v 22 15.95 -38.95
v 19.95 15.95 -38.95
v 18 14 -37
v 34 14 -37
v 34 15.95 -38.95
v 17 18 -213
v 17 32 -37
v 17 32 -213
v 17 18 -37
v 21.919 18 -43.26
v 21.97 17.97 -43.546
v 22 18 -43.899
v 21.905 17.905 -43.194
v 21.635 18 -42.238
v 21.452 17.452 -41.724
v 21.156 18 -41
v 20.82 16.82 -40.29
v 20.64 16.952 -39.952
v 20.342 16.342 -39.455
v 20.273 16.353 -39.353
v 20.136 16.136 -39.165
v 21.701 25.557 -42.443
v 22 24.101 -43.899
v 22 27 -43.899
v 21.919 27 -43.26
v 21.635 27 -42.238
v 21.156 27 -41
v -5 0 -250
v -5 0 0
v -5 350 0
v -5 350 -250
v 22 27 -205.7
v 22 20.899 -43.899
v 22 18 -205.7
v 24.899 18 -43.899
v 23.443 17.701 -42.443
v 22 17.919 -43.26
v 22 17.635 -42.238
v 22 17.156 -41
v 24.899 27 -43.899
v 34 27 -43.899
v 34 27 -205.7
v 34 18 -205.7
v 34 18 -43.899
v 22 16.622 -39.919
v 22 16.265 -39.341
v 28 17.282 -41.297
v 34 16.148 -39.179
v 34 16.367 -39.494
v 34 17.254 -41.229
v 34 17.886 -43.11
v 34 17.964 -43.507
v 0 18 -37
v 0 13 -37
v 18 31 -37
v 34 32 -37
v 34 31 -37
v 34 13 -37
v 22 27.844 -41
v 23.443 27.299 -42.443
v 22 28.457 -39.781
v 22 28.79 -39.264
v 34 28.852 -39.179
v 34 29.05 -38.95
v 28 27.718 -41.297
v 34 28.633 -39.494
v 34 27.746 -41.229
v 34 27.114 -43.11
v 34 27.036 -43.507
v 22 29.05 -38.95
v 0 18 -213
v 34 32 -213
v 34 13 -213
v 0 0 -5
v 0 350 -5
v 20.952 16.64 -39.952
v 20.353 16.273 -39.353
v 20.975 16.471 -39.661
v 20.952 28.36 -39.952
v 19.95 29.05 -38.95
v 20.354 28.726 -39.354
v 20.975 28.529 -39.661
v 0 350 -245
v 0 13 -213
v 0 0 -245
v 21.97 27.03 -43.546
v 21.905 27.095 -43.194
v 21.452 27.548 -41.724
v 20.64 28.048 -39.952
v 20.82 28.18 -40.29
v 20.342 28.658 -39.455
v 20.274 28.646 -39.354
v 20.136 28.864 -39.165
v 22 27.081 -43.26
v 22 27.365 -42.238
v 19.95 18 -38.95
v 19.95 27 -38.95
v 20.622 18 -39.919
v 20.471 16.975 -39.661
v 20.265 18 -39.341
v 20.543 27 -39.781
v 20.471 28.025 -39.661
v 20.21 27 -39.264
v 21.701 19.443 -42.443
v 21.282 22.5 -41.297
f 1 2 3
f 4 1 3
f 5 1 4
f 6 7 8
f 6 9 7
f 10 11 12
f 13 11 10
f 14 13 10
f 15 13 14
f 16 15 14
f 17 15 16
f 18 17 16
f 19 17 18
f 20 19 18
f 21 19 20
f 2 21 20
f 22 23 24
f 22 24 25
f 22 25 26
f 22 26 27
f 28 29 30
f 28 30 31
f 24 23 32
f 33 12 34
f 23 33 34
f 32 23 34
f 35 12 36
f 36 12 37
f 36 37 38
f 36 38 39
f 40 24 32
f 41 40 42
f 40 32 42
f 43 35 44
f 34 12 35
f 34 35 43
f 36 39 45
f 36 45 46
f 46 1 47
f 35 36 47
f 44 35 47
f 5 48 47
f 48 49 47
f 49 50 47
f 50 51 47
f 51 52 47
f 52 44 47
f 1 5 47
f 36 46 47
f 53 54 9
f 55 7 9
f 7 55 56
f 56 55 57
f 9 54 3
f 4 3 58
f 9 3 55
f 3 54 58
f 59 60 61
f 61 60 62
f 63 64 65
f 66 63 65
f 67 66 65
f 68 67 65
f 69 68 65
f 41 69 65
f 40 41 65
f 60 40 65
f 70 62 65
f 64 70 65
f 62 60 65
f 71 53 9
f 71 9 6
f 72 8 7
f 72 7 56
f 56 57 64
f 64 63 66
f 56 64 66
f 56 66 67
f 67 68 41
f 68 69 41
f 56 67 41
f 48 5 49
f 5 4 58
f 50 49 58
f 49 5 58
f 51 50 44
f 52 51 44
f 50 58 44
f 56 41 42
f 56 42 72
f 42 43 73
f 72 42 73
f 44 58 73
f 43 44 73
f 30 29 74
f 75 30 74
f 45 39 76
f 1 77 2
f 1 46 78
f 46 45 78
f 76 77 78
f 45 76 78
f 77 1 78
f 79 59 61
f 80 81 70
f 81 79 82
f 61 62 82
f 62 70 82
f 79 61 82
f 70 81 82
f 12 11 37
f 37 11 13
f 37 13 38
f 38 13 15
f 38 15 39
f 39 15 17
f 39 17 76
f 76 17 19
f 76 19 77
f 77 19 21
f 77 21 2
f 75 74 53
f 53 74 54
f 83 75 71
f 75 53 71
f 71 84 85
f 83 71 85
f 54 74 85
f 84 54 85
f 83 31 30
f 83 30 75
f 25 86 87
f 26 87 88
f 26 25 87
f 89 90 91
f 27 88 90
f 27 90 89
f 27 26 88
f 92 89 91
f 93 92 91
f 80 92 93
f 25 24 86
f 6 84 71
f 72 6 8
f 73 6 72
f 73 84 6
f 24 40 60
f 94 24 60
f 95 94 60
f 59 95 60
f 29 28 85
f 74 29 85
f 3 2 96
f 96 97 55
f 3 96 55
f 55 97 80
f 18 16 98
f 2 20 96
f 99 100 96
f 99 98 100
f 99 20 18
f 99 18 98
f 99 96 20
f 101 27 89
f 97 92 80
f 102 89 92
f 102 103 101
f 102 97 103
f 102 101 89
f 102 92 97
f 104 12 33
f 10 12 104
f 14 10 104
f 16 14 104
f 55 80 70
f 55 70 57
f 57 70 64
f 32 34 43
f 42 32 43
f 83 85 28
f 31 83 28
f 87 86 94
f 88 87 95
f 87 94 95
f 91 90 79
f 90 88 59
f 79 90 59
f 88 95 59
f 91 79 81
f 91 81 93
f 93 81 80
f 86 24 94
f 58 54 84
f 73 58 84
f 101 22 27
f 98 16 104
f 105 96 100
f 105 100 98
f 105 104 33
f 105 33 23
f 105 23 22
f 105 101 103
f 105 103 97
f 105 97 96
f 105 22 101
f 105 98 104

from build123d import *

# Parameters (mm, degrees)
CROQUIS1_W              = 5
CROQUIS1_H              = 250
SALIENTE_EXTRUIR1_DEPTH = 350
CORTAR_EXTRUIR1_REACH   = 432.145
CROQUIS4_W              = 176
CROQUIS4_H              = 5
SALIENTE_EXTRUIR2_DEPTH = 34
CROQUIS5_W              = 5
CROQUIS5_H              = 176
SALIENTE_EXTRUIR3_DEPTH = 9
CROQUIS6_W              = 17
CROQUIS6_H              = 176
SALIENTE_EXTRUIR4_DEPTH = 5
CHAFL_N1_SIZE           = 4
CROQUIS7_W              = 14.582348404
CROQUIS7_H              = 7.3
SALIENTE_EXTRUIR5_DEPTH = 10


with BuildPart() as part:
    # Croquis1 → Saliente-Extruir1 (new body)
    with BuildSketch(Plane(origin=(0, 0, 0), x_dir=(1, 0, 0), z_dir=(0, 1, 0))):
        with Locations((-2.5, 125)):
            Rectangle(CROQUIS1_W, CROQUIS1_H)
    extrude(amount=SALIENTE_EXTRUIR1_DEPTH)

    # Croquis2 → Cortar-Extruir1 (cut, up to next)
    with BuildSketch(Plane(origin=(0, 350, 0), x_dir=(1, 0, 0), z_dir=(0, 1, 0)), mode=Mode.PRIVATE) as cortar_extruir1_sk1:
        Polygon((0, 250), (0, 245), (-5, 250), align=None)
    cortar_extruir1_tool1 = extrude(cortar_extruir1_sk1.sketch, amount=-CORTAR_EXTRUIR1_REACH, mode=Mode.PRIVATE) & part.part
    # Croquis2 → Cortar-Extruir1 (cut, up to next)
    with BuildSketch(Plane(origin=(0, 350, 0), x_dir=(1, 0, 0), z_dir=(0, 1, 0)), mode=Mode.PRIVATE) as cortar_extruir1_sk2:
        Polygon((-5, 0), (0, 5), (0, 0), align=None)
    cortar_extruir1_tool2 = extrude(cortar_extruir1_sk2.sketch, amount=-CORTAR_EXTRUIR1_REACH, mode=Mode.PRIVATE) & part.part
    add(cortar_extruir1_tool1.solids().sort_by_distance((-1.666667, 350, -248.333333))[0], mode=Mode.SUBTRACT)
    add(cortar_extruir1_tool2.solids().sort_by_distance((-1.666667, 350, -1.666667))[0], mode=Mode.SUBTRACT)

    # Croquis4 → Saliente-Extruir2 (add)
    with BuildSketch(Plane(origin=(0, 0, 0), x_dir=(0, 0, -1), z_dir=(1, 0, 0))):
        with Locations((125, 15.5)):
            Rectangle(CROQUIS4_W, CROQUIS4_H)
    extrude(amount=SALIENTE_EXTRUIR2_DEPTH)

    # Croquis5 → Saliente-Extruir3 (add)
    with BuildSketch(Plane(origin=(0, 18, 0), x_dir=(1, 0, 0), z_dir=(0, 1, 0))):
        with Locations((19.5, 125)):
            Rectangle(CROQUIS5_W, CROQUIS5_H)
    extrude(amount=SALIENTE_EXTRUIR3_DEPTH)

    # Croquis6 → Saliente-Extruir4 (add)
    with BuildSketch(Plane(origin=(0, 27, 0), x_dir=(1, 0, 0), z_dir=(0, 1, 0))):
        with Locations((25.5, 125)):
            Rectangle(CROQUIS6_W, CROQUIS6_H)
    extrude(amount=SALIENTE_EXTRUIR4_DEPTH)

    # Chaflán1
    chafl_n1_edges = [part.edges().sort_by_distance(p)[0] for p in [
        (28, 18, -37),
        (22, 22.5, -37),
        (28, 27, -37),
    ]]
    chamfer(chafl_n1_edges, length=CHAFL_N1_SIZE)

    # Redondeo1
    # a fillet whose section is not a circle: 7 mm, written as the material it takes off along each edge
    with BuildSketch(Plane(origin=(14.751262658, 18, -41), x_dir=(0, 0, -1), z_dir=(1, 0, 0))) as redondeo1_piece_1_section:
        with BuildLine():
            Bezier((2.899494937, 0), (0, 0), (-2.050252532, -2.050252532), weights=[1, 0.428571429, 1])
            Line((-2.050252532, -2.050252532), (0, 0))
            Line((0, 0), (2.899494937, 0))
        make_face()
    redondeo1_piece_1 = extrude(amount=26.497474683, mode=Mode.PRIVATE)
    redondeo1_piece_1 = split(redondeo1_piece_1, bisect_by=Plane(origin=(22, 18, -41), z_dir=(-1, 0, 0)), keep=Keep.TOP, mode=Mode.PRIVATE)
    redondeo1_piece_1 = split(redondeo1_piece_1, bisect_by=Plane(origin=(18.375631329, 18, -37.375631329), z_dir=(0.7071067811865476, 0, 0.7071067811865476)), keep=Keep.TOP, mode=Mode.PRIVATE)
    add(redondeo1_piece_1, mode=Mode.SUBTRACT)
    with BuildSketch(Plane(origin=(22, 18, -41), x_dir=(0, 0, -1), z_dir=(1, 0, 0))) as redondeo1_piece_2_section:
        with BuildLine():
            Bezier((2.899494937, 0), (0, 0), (-2.050252532, -2.050252532), weights=[1, 0.428571429, 1])
            Line((-2.050252532, -2.050252532), (0, 0))
            Line((0, 0), (2.899494937, 0))
        make_face()
    redondeo1_piece_2 = extrude(amount=19.248737342, mode=Mode.PRIVATE)
    redondeo1_piece_2 = split(redondeo1_piece_2, bisect_by=Plane(origin=(22, 18, -41), z_dir=(-0.7071067811865476, 0, -0.7071067811865476)), keep=Keep.TOP, mode=Mode.PRIVATE)
    add(redondeo1_piece_2, mode=Mode.SUBTRACT)
    with BuildSketch(Plane(origin=(22, 18, -41), x_dir=(0, 0, -1), z_dir=(1, 0, 0))) as redondeo1_piece_3_section:
        with BuildLine():
            Bezier((2.899494937, 0), (0, 0), (-2.050252532, -2.050252532), weights=[1, 0.428571429, 1])
            Line((-2.050252532, -2.050252532), (0, 0))
            Line((0, 0), (2.899494937, 0))
        make_face()
    redondeo1_piece_3 = extrude(amount=19.248737342, mode=Mode.PRIVATE)
    redondeo1_piece_3 = split(redondeo1_piece_3, bisect_by=Plane(origin=(22, 18, -41), z_dir=(0.7071067811865476, 0, 0.7071067811865476)), keep=Keep.TOP, mode=Mode.PRIVATE)
    add(redondeo1_piece_3, mode=Mode.SUBTRACT)
    with BuildSketch(Plane(origin=(22, 10.751262658, -41), x_dir=(0, 0, -1), z_dir=(0, 1, 0))) as redondeo1_piece_4_section:
        with BuildLine():
            Bezier((2.899494937, 0), (0, 0), (-2.050252532, 2.050252532), weights=[1, 0.428571429, 1])
            Line((-2.050252532, 2.050252532), (0, 0))
            Line((0, 0), (2.899494937, 0))
        make_face()
    redondeo1_piece_4 = extrude(amount=16.248737342, mode=Mode.PRIVATE)
    redondeo1_piece_4 = split(redondeo1_piece_4, bisect_by=Plane(origin=(22, 18, -41), z_dir=(0, -1, 0)), keep=Keep.TOP, mode=Mode.PRIVATE)
    redondeo1_piece_4 = split(redondeo1_piece_4, bisect_by=Plane(origin=(22, 14.375631329, -37.375631329), z_dir=(0, 0.7071067811865476, 0.7071067811865476)), keep=Keep.TOP, mode=Mode.PRIVATE)
    add(redondeo1_piece_4, mode=Mode.SUBTRACT)
    with BuildSketch(Plane(origin=(22, 18, -41), x_dir=(0, 0, -1), z_dir=(0, 1, 0))) as redondeo1_piece_5_section:
        with BuildLine():
            Bezier((2.899494937, 0), (0, 0), (-2.050252532, 2.050252532), weights=[1, 0.428571429, 1])
            Line((-2.050252532, 2.050252532), (0, 0))
            Line((0, 0), (2.899494937, 0))
        make_face()
    redondeo1_piece_5 = extrude(amount=9, mode=Mode.PRIVATE)
    redondeo1_piece_5 = split(redondeo1_piece_5, bisect_by=Plane(origin=(22, 18, -41), z_dir=(0, -0.7071067811865476, -0.7071067811865476)), keep=Keep.TOP, mode=Mode.PRIVATE)
    add(redondeo1_piece_5, mode=Mode.SUBTRACT)
    with BuildSketch(Plane(origin=(22, 18, -41), x_dir=(0, 0, -1), z_dir=(0, 1, 0))) as redondeo1_piece_6_section:
        with BuildLine():
            Bezier((2.899494937, 0), (0, 0), (-2.050252532, 2.050252532), weights=[1, 0.428571429, 1])
            Line((-2.050252532, 2.050252532), (0, 0))
            Line((0, 0), (2.899494937, 0))
        make_face()
    redondeo1_piece_6 = extrude(amount=9, mode=Mode.PRIVATE)
    redondeo1_piece_6 = split(redondeo1_piece_6, bisect_by=Plane(origin=(22, 18, -41), z_dir=(0, 0.7071067811865476, 0.7071067811865476)), keep=Keep.TOP, mode=Mode.PRIVATE)
    redondeo1_piece_6 = split(redondeo1_piece_6, bisect_by=Plane(origin=(22, 22.5, -45.5), z_dir=(0, -0.7071067811865476, 0.7071067811865476)), keep=Keep.TOP, mode=Mode.PRIVATE)
    add(redondeo1_piece_6, mode=Mode.SUBTRACT)
    with BuildSketch(Plane(origin=(22, 18, -41), x_dir=(0, 0, -1), z_dir=(0, 1, 0))) as redondeo1_piece_7_section:
        with BuildLine():
            Bezier((2.899494937, 0), (0, 0), (-2.050252532, 2.050252532), weights=[1, 0.428571429, 1])
            Line((-2.050252532, 2.050252532), (0, 0))
            Line((0, 0), (2.899494937, 0))
        make_face()
    redondeo1_piece_7 = extrude(amount=16.248737342, mode=Mode.PRIVATE)
    redondeo1_piece_7 = split(redondeo1_piece_7, bisect_by=Plane(origin=(22, 27, -41), z_dir=(0, 1, 0)), keep=Keep.TOP, mode=Mode.PRIVATE)
    redondeo1_piece_7 = split(redondeo1_piece_7, bisect_by=Plane(origin=(22, 22.5, -45.5), z_dir=(0, -0.7071067811865476, 0.7071067811865476)), keep=Keep.TOP, mode=Mode.PRIVATE)
    add(redondeo1_piece_7, mode=Mode.SUBTRACT)
    with BuildSketch(Plane(origin=(22, 18, -41), x_dir=(0, 0, -1), z_dir=(0, 1, 0))) as redondeo1_piece_8_section:
        with BuildLine():
            Bezier((2.899494937, 0), (0, 0), (-2.050252532, 2.050252532), weights=[1, 0.428571429, 1])
            Line((-2.050252532, 2.050252532), (0, 0))
            Line((0, 0), (2.899494937, 0))
        make_face()
    redondeo1_piece_8 = extrude(amount=9, mode=Mode.PRIVATE)
    redondeo1_piece_8 = split(redondeo1_piece_8, bisect_by=Plane(origin=(22, 22.5, -45.5), z_dir=(0, 0.7071067811865476, -0.7071067811865476)), keep=Keep.TOP, mode=Mode.PRIVATE)
    add(redondeo1_piece_8, mode=Mode.SUBTRACT)
    with BuildSketch(Plane(origin=(41.248737342, 27, -41), x_dir=(0, 0, -1), z_dir=(-1, 0, 0))) as redondeo1_piece_9_section:
        with BuildLine():
            Bezier((2.899494937, 0), (0, 0), (-2.050252532, -2.050252532), weights=[1, 0.428571429, 1])
            Line((-2.050252532, -2.050252532), (0, 0))
            Line((0, 0), (2.899494937, 0))
        make_face()
    redondeo1_piece_9 = extrude(amount=19.248737342, mode=Mode.PRIVATE)
    redondeo1_piece_9 = split(redondeo1_piece_9, bisect_by=Plane(origin=(31.624368671, 27, -50.624368671), z_dir=(0.7071067811865476, 0, 0.7071067811865476)), keep=Keep.TOP, mode=Mode.PRIVATE)
    add(redondeo1_piece_9, mode=Mode.SUBTRACT)
    with BuildSketch(Plane(origin=(41.248737342, 27, -41), x_dir=(0, 0, -1), z_dir=(-1, 0, 0))) as redondeo1_piece_10_section:
        with BuildLine():
            Bezier((2.899494937, 0), (0, 0), (-2.050252532, -2.050252532), weights=[1, 0.428571429, 1])
            Line((-2.050252532, -2.050252532), (0, 0))
            Line((0, 0), (2.899494937, 0))
        make_face()
    redondeo1_piece_10 = extrude(amount=26.497474683, mode=Mode.PRIVATE)
    redondeo1_piece_10 = split(redondeo1_piece_10, bisect_by=Plane(origin=(22, 27, -41), z_dir=(-1, 0, 0)), keep=Keep.TOP, mode=Mode.PRIVATE)
    redondeo1_piece_10 = split(redondeo1_piece_10, bisect_by=Plane(origin=(31.624368671, 27, -50.624368671), z_dir=(0.7071067811865476, 0, 0.7071067811865476)), keep=Keep.TOP, mode=Mode.PRIVATE)
    add(redondeo1_piece_10, mode=Mode.SUBTRACT)
    with BuildSketch(Plane(origin=(41.248737342, 27, -41), x_dir=(0, 0, -1), z_dir=(-1, 0, 0))) as redondeo1_piece_11_section:
        with BuildLine():
            Bezier((2.899494937, 0), (0, 0), (-2.050252532, -2.050252532), weights=[1, 0.428571429, 1])
            Line((-2.050252532, -2.050252532), (0, 0))
            Line((0, 0), (2.899494937, 0))
        make_face()
    redondeo1_piece_11 = extrude(amount=19.248737342, mode=Mode.PRIVATE)
    redondeo1_piece_11 = split(redondeo1_piece_11, bisect_by=Plane(origin=(31.624368671, 27, -50.624368671), z_dir=(-0.7071067811865476, 0, -0.7071067811865476)), keep=Keep.TOP, mode=Mode.PRIVATE)
    add(redondeo1_piece_11, mode=Mode.SUBTRACT)
    with BuildSketch(Plane(origin=(14.751262658, 18, -41), x_dir=(0, 0, -1), z_dir=(1, 0, 0))) as redondeo1_piece_12a_section:
        with BuildLine():
            Bezier((2.899494937, 0), (0, 0), (-2.050252532, -2.050252532), weights=[1, 0.428571429, 1])
            Line((-2.050252532, -2.050252532), (0, 0))
            Line((0, 0), (2.899494937, 0))
        make_face()
    redondeo1_piece_12a = extrude(amount=26.497474683, mode=Mode.PRIVATE)
    redondeo1_piece_12a = split(redondeo1_piece_12a, bisect_by=Plane(origin=(22, 18, -41), z_dir=(-1, 0, 0)), keep=Keep.TOP, mode=Mode.PRIVATE)
    redondeo1_piece_12a = split(redondeo1_piece_12a, bisect_by=Plane(origin=(18.375631329, 18, -37.375631329), z_dir=(-0.7071067811865476, 0, -0.7071067811865476)), keep=Keep.TOP, mode=Mode.PRIVATE)
    redondeo1_piece_12a = split(redondeo1_piece_12a, bisect_by=Plane(origin=(17, 18, -41), z_dir=(1, 0, 0)), keep=Keep.TOP, mode=Mode.PRIVATE)
    with BuildSketch(Plane(origin=(22, 10.751262658, -41), x_dir=(0, 0, -1), z_dir=(0, 1, 0))) as redondeo1_piece_12b_section:
        with BuildLine():
            Bezier((2.899494937, 0), (0, 0), (-2.050252532, 2.050252532), weights=[1, 0.428571429, 1])
            Line((-2.050252532, 2.050252532), (0, 0))
            Line((0, 0), (2.899494937, 0))
        make_face()
    redondeo1_piece_12b = extrude(amount=16.248737342, mode=Mode.PRIVATE)
    redondeo1_piece_12b = split(redondeo1_piece_12b, bisect_by=Plane(origin=(22, 18, -41), z_dir=(0, -1, 0)), keep=Keep.TOP, mode=Mode.PRIVATE)
    redondeo1_piece_12b = split(redondeo1_piece_12b, bisect_by=Plane(origin=(22, 14.375631329, -37.375631329), z_dir=(0, -0.7071067811865476, -0.7071067811865476)), keep=Keep.TOP, mode=Mode.PRIVATE)
    redondeo1_piece_12 = redondeo1_piece_12a & redondeo1_piece_12b
    add(redondeo1_piece_12, mode=Mode.SUBTRACT)
    with BuildSketch(Plane(origin=(22, 18, -41), x_dir=(0, 0, -1), z_dir=(0, 1, 0))) as redondeo1_piece_13a_section:
        with BuildLine():
            Bezier((2.899494937, 0), (0, 0), (-2.050252532, 2.050252532), weights=[1, 0.428571429, 1])
            Line((-2.050252532, 2.050252532), (0, 0))
            Line((0, 0), (2.899494937, 0))
        make_face()
    redondeo1_piece_13a = extrude(amount=16.248737342, mode=Mode.PRIVATE)
    redondeo1_piece_13a = split(redondeo1_piece_13a, bisect_by=Plane(origin=(22, 27, -41), z_dir=(0, 1, 0)), keep=Keep.TOP, mode=Mode.PRIVATE)
    redondeo1_piece_13a = split(redondeo1_piece_13a, bisect_by=Plane(origin=(22, 22.5, -45.5), z_dir=(0, 0.7071067811865476, -0.7071067811865476)), keep=Keep.TOP, mode=Mode.PRIVATE)
    with BuildSketch(Plane(origin=(41.248737342, 27, -41), x_dir=(0, 0, -1), z_dir=(-1, 0, 0))) as redondeo1_piece_13b_section:
        with BuildLine():
            Bezier((2.899494937, 0), (0, 0), (-2.050252532, -2.050252532), weights=[1, 0.428571429, 1])
            Line((-2.050252532, -2.050252532), (0, 0))
            Line((0, 0), (2.899494937, 0))
        make_face()
    redondeo1_piece_13b = extrude(amount=26.497474683, mode=Mode.PRIVATE)
    redondeo1_piece_13b = split(redondeo1_piece_13b, bisect_by=Plane(origin=(22, 27, -41), z_dir=(-1, 0, 0)), keep=Keep.TOP, mode=Mode.PRIVATE)
    redondeo1_piece_13b = split(redondeo1_piece_13b, bisect_by=Plane(origin=(31.624368671, 27, -50.624368671), z_dir=(-0.7071067811865476, 0, -0.7071067811865476)), keep=Keep.TOP, mode=Mode.PRIVATE)
    redondeo1_piece_13 = redondeo1_piece_13a & redondeo1_piece_13b
    add(redondeo1_piece_13, mode=Mode.SUBTRACT)

    # Croquis7 → Saliente-Extruir5 (add)
    with BuildSketch(Plane(origin=(0, 18, 0), x_dir=(1, 0, 0), z_dir=(0, 1, 0))):
        with Locations((26.708825798, 209.35)):
            Rectangle(CROQUIS7_W, CROQUIS7_H)
    extrude(amount=SALIENTE_EXTRUIR5_DEPTH)


solid = part.part
